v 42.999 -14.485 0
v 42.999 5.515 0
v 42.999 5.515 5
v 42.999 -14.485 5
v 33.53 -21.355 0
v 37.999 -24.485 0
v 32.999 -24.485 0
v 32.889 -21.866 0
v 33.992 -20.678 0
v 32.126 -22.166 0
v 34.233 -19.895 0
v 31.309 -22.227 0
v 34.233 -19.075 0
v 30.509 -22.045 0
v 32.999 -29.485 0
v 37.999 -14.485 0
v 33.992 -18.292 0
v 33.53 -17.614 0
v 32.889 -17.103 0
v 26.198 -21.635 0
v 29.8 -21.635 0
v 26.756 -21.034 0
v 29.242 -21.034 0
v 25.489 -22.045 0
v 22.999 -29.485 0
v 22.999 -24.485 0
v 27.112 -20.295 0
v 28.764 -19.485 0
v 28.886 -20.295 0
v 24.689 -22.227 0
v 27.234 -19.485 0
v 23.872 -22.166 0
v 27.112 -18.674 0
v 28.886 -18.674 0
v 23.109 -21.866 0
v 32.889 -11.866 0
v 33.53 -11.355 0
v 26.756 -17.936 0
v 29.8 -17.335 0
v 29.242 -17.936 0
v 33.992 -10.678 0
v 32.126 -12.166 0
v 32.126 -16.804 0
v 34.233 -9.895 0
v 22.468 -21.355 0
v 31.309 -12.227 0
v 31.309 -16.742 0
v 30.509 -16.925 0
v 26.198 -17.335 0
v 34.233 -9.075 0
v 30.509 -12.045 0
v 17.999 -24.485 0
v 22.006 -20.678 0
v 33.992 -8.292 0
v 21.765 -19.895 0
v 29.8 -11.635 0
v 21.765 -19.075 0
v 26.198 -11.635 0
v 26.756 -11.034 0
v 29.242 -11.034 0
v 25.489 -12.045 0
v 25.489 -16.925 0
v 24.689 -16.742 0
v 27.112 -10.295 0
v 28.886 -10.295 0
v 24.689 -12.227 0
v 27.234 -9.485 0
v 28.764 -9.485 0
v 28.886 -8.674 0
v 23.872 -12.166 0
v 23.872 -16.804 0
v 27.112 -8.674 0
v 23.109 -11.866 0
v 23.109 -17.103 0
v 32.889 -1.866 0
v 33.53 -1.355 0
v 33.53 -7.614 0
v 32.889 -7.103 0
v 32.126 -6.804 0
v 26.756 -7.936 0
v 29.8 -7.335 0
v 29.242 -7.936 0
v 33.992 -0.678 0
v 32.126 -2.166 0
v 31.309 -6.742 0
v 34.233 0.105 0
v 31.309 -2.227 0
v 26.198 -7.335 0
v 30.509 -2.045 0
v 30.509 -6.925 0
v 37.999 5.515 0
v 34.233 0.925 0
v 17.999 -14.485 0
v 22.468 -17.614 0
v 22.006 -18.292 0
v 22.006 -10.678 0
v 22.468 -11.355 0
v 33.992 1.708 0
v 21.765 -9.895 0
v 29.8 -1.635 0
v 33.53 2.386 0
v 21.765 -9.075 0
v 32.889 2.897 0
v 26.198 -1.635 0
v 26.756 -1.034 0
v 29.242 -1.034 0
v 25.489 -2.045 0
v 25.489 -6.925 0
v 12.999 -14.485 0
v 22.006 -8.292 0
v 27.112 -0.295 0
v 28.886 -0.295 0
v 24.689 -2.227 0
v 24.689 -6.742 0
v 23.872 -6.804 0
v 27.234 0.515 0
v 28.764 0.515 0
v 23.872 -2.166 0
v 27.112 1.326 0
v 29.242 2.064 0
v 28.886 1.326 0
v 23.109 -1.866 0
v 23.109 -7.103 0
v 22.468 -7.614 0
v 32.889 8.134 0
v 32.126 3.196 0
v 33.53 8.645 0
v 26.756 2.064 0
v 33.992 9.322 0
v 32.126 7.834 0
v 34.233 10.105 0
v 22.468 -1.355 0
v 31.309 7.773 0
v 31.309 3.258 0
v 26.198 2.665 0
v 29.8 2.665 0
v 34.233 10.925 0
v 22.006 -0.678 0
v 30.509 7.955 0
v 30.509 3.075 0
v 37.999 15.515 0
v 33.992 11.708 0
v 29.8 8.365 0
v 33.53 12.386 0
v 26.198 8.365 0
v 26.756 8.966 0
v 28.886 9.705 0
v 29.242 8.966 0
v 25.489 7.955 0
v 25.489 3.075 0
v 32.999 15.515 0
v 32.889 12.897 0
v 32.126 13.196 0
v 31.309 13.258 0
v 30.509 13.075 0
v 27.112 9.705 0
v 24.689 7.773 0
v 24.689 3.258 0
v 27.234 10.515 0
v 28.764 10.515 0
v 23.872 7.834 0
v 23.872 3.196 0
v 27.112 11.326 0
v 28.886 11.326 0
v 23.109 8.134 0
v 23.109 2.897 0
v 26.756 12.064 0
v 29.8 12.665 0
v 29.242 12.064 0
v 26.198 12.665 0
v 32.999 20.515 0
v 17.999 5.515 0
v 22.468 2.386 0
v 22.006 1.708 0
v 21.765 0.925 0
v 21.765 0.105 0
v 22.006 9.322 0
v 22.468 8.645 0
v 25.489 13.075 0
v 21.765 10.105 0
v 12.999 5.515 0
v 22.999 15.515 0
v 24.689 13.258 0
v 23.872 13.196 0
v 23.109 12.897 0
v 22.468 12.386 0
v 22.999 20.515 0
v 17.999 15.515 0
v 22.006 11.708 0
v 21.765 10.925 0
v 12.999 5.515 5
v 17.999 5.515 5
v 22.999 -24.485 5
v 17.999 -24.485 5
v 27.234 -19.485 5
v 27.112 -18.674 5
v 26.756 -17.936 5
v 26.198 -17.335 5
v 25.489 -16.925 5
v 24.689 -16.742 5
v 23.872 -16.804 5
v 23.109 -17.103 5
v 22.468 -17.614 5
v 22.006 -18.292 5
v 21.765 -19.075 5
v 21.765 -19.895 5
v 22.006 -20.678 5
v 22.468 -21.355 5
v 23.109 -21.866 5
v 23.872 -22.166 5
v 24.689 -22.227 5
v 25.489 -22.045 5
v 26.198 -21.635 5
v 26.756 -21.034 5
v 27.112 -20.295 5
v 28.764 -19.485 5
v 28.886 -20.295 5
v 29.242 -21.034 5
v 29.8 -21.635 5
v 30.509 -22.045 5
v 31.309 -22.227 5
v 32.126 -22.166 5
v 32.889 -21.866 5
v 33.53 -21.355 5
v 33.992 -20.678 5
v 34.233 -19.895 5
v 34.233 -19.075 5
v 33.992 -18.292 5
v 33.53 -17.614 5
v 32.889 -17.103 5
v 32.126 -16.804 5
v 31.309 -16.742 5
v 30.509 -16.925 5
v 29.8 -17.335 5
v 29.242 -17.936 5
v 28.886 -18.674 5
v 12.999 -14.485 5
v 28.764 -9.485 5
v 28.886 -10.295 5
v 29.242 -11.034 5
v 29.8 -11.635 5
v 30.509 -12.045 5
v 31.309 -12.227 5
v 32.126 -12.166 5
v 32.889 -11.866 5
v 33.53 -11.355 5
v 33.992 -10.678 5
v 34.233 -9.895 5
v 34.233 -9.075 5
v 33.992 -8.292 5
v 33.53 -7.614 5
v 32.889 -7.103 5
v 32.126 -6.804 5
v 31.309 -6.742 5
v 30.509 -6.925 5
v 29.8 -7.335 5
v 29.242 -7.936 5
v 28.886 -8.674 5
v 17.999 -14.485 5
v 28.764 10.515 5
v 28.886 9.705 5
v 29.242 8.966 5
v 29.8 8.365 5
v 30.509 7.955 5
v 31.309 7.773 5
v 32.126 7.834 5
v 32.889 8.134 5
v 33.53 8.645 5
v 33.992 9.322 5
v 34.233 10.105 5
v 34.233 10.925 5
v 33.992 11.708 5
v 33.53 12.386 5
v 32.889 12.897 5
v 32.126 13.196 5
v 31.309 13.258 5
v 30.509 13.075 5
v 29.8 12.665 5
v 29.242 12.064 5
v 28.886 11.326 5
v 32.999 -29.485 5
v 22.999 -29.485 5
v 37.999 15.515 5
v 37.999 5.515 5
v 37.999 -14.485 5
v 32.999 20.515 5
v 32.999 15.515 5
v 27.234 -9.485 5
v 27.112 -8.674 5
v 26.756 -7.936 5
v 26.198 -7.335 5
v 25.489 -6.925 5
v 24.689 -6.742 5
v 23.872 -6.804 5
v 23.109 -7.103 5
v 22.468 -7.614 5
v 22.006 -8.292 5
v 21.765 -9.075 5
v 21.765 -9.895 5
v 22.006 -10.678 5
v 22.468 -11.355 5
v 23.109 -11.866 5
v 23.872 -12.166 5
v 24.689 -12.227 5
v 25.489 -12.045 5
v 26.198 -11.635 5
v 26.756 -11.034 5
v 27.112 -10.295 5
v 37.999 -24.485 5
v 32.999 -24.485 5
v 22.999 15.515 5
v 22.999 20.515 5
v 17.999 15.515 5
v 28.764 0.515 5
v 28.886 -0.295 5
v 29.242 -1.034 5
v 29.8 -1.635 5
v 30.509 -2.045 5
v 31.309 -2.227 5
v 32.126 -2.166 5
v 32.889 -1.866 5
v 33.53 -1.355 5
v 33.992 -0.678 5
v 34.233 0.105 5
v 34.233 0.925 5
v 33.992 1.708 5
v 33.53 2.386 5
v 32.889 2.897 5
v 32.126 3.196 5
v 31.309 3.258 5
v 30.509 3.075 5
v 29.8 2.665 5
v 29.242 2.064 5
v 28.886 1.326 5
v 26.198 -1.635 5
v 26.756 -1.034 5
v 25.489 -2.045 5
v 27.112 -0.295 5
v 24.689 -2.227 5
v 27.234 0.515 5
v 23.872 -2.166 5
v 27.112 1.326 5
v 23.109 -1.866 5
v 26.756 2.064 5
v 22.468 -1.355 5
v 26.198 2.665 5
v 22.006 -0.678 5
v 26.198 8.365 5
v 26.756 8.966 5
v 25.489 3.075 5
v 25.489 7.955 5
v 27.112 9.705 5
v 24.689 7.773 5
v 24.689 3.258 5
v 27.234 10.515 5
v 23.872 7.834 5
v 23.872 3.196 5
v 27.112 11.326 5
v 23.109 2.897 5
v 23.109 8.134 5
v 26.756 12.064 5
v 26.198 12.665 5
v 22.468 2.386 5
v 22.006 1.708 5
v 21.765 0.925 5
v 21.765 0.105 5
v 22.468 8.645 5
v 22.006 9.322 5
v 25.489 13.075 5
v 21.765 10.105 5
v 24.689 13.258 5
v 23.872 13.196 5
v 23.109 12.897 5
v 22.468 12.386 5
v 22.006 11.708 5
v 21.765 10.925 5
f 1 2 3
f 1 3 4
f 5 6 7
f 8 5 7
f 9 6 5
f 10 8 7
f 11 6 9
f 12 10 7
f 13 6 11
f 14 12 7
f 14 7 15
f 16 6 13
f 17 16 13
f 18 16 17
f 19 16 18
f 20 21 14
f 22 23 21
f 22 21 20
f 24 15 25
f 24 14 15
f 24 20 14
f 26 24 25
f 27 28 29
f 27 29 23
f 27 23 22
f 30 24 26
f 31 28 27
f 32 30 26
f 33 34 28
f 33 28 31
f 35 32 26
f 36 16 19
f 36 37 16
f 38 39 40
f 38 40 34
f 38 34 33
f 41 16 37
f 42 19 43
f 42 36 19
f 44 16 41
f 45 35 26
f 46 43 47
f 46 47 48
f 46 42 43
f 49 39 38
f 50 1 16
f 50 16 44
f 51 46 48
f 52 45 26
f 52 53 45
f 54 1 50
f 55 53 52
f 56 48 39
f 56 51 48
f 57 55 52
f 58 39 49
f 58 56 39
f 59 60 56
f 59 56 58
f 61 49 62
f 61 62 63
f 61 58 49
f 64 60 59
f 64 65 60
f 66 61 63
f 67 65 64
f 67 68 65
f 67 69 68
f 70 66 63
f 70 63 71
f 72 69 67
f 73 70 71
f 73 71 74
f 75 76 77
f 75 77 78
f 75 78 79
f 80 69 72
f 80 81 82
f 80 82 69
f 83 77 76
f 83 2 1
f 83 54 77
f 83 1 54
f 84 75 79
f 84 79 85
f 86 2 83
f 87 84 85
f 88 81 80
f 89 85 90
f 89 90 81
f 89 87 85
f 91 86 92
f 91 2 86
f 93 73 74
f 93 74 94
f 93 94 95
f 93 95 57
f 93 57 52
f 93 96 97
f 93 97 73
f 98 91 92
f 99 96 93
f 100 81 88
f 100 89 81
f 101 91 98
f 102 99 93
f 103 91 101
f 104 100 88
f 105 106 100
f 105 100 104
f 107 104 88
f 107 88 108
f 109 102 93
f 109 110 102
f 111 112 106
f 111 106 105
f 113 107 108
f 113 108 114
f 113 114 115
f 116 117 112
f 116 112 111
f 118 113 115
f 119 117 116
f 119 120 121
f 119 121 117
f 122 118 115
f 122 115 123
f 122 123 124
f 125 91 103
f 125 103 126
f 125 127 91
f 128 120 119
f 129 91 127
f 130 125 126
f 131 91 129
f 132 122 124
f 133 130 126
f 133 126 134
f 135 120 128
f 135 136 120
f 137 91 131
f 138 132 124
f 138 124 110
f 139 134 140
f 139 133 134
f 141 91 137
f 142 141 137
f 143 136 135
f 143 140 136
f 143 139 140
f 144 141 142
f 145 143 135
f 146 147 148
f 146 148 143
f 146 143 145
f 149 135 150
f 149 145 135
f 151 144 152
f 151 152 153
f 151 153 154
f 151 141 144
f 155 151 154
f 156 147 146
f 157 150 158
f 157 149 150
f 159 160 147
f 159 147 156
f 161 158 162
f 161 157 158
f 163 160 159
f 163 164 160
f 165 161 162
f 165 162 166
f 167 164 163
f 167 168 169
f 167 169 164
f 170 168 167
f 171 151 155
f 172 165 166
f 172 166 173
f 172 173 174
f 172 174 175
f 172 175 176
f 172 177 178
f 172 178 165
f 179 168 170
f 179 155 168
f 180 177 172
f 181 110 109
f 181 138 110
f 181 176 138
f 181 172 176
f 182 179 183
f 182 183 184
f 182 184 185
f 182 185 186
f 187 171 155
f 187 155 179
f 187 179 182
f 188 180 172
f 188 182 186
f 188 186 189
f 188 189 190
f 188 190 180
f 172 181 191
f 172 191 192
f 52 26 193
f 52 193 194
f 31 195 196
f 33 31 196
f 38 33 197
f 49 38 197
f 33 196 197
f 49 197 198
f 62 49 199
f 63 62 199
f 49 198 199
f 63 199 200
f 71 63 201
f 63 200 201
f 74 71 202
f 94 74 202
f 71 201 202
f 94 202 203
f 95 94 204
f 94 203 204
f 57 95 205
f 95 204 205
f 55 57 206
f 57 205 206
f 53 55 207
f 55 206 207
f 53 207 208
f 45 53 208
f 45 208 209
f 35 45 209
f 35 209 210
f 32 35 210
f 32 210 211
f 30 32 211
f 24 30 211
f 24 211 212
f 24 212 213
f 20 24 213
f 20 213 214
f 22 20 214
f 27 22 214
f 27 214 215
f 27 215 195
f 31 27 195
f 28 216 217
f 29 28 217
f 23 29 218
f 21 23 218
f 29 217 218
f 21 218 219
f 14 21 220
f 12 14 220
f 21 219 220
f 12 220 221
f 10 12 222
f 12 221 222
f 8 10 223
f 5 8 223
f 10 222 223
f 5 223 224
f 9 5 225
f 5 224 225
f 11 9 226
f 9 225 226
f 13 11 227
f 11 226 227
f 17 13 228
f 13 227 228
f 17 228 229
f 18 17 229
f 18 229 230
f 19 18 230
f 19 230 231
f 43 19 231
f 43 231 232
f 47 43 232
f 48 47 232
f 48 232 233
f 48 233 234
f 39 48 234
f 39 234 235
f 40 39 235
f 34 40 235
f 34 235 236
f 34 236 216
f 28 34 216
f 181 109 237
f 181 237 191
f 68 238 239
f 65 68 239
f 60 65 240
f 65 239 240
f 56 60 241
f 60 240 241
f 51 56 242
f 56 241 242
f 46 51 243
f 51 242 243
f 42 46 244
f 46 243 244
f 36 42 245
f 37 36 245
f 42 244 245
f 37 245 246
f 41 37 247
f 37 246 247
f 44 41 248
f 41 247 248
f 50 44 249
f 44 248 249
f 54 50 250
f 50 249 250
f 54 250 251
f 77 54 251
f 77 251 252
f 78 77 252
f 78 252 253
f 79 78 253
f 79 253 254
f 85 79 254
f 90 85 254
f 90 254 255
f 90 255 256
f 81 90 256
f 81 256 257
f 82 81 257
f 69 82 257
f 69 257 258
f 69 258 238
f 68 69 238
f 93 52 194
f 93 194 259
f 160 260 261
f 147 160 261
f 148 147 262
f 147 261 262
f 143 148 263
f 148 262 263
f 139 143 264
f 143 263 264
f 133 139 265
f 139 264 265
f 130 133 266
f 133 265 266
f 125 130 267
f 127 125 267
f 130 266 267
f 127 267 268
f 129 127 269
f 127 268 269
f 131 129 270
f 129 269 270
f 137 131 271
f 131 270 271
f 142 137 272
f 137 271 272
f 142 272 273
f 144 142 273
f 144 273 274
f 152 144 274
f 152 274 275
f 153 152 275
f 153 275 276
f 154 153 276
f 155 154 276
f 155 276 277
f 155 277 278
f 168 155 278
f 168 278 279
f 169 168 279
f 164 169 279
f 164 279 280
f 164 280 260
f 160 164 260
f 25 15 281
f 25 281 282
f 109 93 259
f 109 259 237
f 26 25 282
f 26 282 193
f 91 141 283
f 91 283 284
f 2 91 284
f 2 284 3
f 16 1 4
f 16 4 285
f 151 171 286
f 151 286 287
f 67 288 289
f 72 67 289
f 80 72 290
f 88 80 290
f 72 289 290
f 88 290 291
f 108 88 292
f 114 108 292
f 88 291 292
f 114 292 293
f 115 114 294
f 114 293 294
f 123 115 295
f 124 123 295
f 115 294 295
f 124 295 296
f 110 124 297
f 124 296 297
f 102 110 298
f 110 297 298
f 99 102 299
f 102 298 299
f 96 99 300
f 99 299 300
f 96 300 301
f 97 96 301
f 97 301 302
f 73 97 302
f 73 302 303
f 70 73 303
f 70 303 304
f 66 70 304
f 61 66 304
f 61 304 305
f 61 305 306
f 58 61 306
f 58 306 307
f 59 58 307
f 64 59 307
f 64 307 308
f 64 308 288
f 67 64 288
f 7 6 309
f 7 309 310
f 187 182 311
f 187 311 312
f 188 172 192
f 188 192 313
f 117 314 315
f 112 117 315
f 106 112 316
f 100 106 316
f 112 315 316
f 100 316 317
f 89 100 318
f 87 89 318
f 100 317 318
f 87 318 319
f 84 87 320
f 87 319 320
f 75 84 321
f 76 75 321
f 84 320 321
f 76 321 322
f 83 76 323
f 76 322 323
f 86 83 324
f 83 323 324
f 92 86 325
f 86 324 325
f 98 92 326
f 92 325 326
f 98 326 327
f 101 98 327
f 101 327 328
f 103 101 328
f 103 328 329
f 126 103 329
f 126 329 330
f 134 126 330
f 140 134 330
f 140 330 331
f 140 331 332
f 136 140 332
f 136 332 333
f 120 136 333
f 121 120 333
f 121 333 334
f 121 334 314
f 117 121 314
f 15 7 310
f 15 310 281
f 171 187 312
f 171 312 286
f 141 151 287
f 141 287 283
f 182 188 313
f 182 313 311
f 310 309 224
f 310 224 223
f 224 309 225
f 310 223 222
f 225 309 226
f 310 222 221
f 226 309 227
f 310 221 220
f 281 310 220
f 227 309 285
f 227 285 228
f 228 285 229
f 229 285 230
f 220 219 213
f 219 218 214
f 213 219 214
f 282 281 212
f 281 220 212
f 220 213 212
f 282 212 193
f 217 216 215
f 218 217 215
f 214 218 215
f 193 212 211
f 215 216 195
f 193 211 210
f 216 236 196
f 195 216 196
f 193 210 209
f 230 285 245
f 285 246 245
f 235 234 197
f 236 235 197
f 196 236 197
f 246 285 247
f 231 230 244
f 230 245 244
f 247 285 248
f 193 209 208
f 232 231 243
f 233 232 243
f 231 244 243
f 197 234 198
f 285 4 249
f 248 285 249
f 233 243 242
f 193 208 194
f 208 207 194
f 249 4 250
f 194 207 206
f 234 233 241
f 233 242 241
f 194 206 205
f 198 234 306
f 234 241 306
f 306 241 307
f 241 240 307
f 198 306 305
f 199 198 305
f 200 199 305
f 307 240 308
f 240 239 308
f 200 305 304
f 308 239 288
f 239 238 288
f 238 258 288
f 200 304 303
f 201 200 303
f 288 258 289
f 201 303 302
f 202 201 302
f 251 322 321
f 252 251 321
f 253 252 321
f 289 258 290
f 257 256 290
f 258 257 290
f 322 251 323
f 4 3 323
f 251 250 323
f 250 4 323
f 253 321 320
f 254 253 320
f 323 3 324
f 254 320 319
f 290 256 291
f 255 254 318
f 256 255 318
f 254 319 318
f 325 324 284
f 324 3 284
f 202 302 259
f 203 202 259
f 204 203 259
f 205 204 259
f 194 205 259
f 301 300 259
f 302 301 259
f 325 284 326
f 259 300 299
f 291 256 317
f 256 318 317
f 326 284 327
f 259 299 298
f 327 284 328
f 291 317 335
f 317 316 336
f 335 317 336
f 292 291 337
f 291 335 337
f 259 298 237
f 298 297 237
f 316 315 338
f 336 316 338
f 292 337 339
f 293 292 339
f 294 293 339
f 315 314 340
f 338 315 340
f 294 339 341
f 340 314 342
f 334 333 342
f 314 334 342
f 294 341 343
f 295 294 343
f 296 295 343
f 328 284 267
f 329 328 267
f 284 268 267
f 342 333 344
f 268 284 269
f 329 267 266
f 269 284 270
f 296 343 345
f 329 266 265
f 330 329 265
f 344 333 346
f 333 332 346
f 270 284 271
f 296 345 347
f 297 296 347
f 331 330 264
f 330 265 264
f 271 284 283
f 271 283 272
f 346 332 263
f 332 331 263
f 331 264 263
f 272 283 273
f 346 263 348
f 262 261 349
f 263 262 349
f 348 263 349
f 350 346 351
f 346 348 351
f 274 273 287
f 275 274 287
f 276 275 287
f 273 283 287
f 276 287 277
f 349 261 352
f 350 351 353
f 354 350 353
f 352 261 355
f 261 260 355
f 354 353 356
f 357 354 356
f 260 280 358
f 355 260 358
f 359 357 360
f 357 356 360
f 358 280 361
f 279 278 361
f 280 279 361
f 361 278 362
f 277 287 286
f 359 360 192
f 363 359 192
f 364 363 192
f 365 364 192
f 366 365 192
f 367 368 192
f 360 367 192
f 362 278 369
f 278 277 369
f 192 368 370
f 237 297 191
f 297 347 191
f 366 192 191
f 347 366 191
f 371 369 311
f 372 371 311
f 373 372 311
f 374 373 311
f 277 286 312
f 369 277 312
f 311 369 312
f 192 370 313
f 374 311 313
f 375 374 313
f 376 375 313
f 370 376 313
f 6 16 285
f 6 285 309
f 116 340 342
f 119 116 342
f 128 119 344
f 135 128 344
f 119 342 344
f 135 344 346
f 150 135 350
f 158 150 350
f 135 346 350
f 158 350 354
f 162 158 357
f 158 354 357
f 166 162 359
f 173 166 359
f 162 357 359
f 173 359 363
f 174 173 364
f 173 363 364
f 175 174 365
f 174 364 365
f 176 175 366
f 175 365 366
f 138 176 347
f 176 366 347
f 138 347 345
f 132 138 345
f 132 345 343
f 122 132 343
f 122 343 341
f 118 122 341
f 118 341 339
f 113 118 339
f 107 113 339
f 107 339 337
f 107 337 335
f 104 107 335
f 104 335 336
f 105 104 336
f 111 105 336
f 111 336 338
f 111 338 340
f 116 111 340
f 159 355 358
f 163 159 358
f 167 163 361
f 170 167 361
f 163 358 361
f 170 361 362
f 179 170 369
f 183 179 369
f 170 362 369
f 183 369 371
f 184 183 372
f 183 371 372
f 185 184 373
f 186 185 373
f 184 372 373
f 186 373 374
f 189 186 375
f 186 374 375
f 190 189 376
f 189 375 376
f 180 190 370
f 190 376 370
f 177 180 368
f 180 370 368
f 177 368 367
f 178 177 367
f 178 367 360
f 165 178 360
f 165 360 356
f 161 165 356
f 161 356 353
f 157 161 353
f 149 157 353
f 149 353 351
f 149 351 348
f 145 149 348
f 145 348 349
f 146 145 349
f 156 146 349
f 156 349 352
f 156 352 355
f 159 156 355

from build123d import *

# Parameters (mm, degrees)
BOSS_EXTRUDE1_DEPTH = 5
SKETCH2_R           = 2.75
CUT_EXTRUDE1_DEPTH  = 53.376168941


with BuildPart() as part:
    # Sketch1 → Boss-Extrude1 (new body)
    with BuildSketch(Plane.XY):
        Polygon((22.999000463, 20.515274598), (32.999000463, 20.515274598), (32.999000463, 15.515274598), (37.999000463, 15.515274598), (37.999000463, 5.515274598), (42.999000463, 5.515274598), (42.999000463, -14.484725402), (37.999000463, -14.484725402), (37.999000463, -24.484725402), (32.999000463, -24.484725402), (32.999000463, -29.484725402), (22.999000463, -29.484725402), (22.999000463, -24.484725402), (17.999000463, -24.484725402), (17.999000463, -14.484725402), (12.999000463, -14.484725402), (12.999000463, 5.515274598), (17.999000463, 5.515274598), (17.999000463, 15.515274598), (22.999000463, 15.515274598), align=None)
    extrude(amount=BOSS_EXTRUDE1_DEPTH)

    # Sketch2 → Cut-Extrude1 (cut, through all)
    with BuildSketch(Plane.XY.offset(5)):
        with Locations((24.48386892, 10.515274598)):
            Circle(SKETCH2_R)
        with Locations((24.48386892, 0.515274598)):
            Circle(SKETCH2_R)
        with Locations((24.48386892, -9.484725402)):
            Circle(SKETCH2_R)
        with Locations((24.48386892, -19.484725402)):
            Circle(SKETCH2_R)
        with Locations(Location((31.514132006, -19.484725402, 0), (0, 0, 180))):
            Circle(SKETCH2_R)
        with Locations(Location((31.514132006, -9.484725402, 0), (0, 0, 180))):
            Circle(SKETCH2_R)
        with Locations(Location((31.514132006, 0.515274598, 0), (0, 0, 180))):
            Circle(SKETCH2_R)
        with Locations(Location((31.514132006, 10.515274598, 0), (0, 0, 180))):
            Circle(SKETCH2_R)
    extrude(amount=-CUT_EXTRUDE1_DEPTH, mode=Mode.SUBTRACT)


solid = part.part
